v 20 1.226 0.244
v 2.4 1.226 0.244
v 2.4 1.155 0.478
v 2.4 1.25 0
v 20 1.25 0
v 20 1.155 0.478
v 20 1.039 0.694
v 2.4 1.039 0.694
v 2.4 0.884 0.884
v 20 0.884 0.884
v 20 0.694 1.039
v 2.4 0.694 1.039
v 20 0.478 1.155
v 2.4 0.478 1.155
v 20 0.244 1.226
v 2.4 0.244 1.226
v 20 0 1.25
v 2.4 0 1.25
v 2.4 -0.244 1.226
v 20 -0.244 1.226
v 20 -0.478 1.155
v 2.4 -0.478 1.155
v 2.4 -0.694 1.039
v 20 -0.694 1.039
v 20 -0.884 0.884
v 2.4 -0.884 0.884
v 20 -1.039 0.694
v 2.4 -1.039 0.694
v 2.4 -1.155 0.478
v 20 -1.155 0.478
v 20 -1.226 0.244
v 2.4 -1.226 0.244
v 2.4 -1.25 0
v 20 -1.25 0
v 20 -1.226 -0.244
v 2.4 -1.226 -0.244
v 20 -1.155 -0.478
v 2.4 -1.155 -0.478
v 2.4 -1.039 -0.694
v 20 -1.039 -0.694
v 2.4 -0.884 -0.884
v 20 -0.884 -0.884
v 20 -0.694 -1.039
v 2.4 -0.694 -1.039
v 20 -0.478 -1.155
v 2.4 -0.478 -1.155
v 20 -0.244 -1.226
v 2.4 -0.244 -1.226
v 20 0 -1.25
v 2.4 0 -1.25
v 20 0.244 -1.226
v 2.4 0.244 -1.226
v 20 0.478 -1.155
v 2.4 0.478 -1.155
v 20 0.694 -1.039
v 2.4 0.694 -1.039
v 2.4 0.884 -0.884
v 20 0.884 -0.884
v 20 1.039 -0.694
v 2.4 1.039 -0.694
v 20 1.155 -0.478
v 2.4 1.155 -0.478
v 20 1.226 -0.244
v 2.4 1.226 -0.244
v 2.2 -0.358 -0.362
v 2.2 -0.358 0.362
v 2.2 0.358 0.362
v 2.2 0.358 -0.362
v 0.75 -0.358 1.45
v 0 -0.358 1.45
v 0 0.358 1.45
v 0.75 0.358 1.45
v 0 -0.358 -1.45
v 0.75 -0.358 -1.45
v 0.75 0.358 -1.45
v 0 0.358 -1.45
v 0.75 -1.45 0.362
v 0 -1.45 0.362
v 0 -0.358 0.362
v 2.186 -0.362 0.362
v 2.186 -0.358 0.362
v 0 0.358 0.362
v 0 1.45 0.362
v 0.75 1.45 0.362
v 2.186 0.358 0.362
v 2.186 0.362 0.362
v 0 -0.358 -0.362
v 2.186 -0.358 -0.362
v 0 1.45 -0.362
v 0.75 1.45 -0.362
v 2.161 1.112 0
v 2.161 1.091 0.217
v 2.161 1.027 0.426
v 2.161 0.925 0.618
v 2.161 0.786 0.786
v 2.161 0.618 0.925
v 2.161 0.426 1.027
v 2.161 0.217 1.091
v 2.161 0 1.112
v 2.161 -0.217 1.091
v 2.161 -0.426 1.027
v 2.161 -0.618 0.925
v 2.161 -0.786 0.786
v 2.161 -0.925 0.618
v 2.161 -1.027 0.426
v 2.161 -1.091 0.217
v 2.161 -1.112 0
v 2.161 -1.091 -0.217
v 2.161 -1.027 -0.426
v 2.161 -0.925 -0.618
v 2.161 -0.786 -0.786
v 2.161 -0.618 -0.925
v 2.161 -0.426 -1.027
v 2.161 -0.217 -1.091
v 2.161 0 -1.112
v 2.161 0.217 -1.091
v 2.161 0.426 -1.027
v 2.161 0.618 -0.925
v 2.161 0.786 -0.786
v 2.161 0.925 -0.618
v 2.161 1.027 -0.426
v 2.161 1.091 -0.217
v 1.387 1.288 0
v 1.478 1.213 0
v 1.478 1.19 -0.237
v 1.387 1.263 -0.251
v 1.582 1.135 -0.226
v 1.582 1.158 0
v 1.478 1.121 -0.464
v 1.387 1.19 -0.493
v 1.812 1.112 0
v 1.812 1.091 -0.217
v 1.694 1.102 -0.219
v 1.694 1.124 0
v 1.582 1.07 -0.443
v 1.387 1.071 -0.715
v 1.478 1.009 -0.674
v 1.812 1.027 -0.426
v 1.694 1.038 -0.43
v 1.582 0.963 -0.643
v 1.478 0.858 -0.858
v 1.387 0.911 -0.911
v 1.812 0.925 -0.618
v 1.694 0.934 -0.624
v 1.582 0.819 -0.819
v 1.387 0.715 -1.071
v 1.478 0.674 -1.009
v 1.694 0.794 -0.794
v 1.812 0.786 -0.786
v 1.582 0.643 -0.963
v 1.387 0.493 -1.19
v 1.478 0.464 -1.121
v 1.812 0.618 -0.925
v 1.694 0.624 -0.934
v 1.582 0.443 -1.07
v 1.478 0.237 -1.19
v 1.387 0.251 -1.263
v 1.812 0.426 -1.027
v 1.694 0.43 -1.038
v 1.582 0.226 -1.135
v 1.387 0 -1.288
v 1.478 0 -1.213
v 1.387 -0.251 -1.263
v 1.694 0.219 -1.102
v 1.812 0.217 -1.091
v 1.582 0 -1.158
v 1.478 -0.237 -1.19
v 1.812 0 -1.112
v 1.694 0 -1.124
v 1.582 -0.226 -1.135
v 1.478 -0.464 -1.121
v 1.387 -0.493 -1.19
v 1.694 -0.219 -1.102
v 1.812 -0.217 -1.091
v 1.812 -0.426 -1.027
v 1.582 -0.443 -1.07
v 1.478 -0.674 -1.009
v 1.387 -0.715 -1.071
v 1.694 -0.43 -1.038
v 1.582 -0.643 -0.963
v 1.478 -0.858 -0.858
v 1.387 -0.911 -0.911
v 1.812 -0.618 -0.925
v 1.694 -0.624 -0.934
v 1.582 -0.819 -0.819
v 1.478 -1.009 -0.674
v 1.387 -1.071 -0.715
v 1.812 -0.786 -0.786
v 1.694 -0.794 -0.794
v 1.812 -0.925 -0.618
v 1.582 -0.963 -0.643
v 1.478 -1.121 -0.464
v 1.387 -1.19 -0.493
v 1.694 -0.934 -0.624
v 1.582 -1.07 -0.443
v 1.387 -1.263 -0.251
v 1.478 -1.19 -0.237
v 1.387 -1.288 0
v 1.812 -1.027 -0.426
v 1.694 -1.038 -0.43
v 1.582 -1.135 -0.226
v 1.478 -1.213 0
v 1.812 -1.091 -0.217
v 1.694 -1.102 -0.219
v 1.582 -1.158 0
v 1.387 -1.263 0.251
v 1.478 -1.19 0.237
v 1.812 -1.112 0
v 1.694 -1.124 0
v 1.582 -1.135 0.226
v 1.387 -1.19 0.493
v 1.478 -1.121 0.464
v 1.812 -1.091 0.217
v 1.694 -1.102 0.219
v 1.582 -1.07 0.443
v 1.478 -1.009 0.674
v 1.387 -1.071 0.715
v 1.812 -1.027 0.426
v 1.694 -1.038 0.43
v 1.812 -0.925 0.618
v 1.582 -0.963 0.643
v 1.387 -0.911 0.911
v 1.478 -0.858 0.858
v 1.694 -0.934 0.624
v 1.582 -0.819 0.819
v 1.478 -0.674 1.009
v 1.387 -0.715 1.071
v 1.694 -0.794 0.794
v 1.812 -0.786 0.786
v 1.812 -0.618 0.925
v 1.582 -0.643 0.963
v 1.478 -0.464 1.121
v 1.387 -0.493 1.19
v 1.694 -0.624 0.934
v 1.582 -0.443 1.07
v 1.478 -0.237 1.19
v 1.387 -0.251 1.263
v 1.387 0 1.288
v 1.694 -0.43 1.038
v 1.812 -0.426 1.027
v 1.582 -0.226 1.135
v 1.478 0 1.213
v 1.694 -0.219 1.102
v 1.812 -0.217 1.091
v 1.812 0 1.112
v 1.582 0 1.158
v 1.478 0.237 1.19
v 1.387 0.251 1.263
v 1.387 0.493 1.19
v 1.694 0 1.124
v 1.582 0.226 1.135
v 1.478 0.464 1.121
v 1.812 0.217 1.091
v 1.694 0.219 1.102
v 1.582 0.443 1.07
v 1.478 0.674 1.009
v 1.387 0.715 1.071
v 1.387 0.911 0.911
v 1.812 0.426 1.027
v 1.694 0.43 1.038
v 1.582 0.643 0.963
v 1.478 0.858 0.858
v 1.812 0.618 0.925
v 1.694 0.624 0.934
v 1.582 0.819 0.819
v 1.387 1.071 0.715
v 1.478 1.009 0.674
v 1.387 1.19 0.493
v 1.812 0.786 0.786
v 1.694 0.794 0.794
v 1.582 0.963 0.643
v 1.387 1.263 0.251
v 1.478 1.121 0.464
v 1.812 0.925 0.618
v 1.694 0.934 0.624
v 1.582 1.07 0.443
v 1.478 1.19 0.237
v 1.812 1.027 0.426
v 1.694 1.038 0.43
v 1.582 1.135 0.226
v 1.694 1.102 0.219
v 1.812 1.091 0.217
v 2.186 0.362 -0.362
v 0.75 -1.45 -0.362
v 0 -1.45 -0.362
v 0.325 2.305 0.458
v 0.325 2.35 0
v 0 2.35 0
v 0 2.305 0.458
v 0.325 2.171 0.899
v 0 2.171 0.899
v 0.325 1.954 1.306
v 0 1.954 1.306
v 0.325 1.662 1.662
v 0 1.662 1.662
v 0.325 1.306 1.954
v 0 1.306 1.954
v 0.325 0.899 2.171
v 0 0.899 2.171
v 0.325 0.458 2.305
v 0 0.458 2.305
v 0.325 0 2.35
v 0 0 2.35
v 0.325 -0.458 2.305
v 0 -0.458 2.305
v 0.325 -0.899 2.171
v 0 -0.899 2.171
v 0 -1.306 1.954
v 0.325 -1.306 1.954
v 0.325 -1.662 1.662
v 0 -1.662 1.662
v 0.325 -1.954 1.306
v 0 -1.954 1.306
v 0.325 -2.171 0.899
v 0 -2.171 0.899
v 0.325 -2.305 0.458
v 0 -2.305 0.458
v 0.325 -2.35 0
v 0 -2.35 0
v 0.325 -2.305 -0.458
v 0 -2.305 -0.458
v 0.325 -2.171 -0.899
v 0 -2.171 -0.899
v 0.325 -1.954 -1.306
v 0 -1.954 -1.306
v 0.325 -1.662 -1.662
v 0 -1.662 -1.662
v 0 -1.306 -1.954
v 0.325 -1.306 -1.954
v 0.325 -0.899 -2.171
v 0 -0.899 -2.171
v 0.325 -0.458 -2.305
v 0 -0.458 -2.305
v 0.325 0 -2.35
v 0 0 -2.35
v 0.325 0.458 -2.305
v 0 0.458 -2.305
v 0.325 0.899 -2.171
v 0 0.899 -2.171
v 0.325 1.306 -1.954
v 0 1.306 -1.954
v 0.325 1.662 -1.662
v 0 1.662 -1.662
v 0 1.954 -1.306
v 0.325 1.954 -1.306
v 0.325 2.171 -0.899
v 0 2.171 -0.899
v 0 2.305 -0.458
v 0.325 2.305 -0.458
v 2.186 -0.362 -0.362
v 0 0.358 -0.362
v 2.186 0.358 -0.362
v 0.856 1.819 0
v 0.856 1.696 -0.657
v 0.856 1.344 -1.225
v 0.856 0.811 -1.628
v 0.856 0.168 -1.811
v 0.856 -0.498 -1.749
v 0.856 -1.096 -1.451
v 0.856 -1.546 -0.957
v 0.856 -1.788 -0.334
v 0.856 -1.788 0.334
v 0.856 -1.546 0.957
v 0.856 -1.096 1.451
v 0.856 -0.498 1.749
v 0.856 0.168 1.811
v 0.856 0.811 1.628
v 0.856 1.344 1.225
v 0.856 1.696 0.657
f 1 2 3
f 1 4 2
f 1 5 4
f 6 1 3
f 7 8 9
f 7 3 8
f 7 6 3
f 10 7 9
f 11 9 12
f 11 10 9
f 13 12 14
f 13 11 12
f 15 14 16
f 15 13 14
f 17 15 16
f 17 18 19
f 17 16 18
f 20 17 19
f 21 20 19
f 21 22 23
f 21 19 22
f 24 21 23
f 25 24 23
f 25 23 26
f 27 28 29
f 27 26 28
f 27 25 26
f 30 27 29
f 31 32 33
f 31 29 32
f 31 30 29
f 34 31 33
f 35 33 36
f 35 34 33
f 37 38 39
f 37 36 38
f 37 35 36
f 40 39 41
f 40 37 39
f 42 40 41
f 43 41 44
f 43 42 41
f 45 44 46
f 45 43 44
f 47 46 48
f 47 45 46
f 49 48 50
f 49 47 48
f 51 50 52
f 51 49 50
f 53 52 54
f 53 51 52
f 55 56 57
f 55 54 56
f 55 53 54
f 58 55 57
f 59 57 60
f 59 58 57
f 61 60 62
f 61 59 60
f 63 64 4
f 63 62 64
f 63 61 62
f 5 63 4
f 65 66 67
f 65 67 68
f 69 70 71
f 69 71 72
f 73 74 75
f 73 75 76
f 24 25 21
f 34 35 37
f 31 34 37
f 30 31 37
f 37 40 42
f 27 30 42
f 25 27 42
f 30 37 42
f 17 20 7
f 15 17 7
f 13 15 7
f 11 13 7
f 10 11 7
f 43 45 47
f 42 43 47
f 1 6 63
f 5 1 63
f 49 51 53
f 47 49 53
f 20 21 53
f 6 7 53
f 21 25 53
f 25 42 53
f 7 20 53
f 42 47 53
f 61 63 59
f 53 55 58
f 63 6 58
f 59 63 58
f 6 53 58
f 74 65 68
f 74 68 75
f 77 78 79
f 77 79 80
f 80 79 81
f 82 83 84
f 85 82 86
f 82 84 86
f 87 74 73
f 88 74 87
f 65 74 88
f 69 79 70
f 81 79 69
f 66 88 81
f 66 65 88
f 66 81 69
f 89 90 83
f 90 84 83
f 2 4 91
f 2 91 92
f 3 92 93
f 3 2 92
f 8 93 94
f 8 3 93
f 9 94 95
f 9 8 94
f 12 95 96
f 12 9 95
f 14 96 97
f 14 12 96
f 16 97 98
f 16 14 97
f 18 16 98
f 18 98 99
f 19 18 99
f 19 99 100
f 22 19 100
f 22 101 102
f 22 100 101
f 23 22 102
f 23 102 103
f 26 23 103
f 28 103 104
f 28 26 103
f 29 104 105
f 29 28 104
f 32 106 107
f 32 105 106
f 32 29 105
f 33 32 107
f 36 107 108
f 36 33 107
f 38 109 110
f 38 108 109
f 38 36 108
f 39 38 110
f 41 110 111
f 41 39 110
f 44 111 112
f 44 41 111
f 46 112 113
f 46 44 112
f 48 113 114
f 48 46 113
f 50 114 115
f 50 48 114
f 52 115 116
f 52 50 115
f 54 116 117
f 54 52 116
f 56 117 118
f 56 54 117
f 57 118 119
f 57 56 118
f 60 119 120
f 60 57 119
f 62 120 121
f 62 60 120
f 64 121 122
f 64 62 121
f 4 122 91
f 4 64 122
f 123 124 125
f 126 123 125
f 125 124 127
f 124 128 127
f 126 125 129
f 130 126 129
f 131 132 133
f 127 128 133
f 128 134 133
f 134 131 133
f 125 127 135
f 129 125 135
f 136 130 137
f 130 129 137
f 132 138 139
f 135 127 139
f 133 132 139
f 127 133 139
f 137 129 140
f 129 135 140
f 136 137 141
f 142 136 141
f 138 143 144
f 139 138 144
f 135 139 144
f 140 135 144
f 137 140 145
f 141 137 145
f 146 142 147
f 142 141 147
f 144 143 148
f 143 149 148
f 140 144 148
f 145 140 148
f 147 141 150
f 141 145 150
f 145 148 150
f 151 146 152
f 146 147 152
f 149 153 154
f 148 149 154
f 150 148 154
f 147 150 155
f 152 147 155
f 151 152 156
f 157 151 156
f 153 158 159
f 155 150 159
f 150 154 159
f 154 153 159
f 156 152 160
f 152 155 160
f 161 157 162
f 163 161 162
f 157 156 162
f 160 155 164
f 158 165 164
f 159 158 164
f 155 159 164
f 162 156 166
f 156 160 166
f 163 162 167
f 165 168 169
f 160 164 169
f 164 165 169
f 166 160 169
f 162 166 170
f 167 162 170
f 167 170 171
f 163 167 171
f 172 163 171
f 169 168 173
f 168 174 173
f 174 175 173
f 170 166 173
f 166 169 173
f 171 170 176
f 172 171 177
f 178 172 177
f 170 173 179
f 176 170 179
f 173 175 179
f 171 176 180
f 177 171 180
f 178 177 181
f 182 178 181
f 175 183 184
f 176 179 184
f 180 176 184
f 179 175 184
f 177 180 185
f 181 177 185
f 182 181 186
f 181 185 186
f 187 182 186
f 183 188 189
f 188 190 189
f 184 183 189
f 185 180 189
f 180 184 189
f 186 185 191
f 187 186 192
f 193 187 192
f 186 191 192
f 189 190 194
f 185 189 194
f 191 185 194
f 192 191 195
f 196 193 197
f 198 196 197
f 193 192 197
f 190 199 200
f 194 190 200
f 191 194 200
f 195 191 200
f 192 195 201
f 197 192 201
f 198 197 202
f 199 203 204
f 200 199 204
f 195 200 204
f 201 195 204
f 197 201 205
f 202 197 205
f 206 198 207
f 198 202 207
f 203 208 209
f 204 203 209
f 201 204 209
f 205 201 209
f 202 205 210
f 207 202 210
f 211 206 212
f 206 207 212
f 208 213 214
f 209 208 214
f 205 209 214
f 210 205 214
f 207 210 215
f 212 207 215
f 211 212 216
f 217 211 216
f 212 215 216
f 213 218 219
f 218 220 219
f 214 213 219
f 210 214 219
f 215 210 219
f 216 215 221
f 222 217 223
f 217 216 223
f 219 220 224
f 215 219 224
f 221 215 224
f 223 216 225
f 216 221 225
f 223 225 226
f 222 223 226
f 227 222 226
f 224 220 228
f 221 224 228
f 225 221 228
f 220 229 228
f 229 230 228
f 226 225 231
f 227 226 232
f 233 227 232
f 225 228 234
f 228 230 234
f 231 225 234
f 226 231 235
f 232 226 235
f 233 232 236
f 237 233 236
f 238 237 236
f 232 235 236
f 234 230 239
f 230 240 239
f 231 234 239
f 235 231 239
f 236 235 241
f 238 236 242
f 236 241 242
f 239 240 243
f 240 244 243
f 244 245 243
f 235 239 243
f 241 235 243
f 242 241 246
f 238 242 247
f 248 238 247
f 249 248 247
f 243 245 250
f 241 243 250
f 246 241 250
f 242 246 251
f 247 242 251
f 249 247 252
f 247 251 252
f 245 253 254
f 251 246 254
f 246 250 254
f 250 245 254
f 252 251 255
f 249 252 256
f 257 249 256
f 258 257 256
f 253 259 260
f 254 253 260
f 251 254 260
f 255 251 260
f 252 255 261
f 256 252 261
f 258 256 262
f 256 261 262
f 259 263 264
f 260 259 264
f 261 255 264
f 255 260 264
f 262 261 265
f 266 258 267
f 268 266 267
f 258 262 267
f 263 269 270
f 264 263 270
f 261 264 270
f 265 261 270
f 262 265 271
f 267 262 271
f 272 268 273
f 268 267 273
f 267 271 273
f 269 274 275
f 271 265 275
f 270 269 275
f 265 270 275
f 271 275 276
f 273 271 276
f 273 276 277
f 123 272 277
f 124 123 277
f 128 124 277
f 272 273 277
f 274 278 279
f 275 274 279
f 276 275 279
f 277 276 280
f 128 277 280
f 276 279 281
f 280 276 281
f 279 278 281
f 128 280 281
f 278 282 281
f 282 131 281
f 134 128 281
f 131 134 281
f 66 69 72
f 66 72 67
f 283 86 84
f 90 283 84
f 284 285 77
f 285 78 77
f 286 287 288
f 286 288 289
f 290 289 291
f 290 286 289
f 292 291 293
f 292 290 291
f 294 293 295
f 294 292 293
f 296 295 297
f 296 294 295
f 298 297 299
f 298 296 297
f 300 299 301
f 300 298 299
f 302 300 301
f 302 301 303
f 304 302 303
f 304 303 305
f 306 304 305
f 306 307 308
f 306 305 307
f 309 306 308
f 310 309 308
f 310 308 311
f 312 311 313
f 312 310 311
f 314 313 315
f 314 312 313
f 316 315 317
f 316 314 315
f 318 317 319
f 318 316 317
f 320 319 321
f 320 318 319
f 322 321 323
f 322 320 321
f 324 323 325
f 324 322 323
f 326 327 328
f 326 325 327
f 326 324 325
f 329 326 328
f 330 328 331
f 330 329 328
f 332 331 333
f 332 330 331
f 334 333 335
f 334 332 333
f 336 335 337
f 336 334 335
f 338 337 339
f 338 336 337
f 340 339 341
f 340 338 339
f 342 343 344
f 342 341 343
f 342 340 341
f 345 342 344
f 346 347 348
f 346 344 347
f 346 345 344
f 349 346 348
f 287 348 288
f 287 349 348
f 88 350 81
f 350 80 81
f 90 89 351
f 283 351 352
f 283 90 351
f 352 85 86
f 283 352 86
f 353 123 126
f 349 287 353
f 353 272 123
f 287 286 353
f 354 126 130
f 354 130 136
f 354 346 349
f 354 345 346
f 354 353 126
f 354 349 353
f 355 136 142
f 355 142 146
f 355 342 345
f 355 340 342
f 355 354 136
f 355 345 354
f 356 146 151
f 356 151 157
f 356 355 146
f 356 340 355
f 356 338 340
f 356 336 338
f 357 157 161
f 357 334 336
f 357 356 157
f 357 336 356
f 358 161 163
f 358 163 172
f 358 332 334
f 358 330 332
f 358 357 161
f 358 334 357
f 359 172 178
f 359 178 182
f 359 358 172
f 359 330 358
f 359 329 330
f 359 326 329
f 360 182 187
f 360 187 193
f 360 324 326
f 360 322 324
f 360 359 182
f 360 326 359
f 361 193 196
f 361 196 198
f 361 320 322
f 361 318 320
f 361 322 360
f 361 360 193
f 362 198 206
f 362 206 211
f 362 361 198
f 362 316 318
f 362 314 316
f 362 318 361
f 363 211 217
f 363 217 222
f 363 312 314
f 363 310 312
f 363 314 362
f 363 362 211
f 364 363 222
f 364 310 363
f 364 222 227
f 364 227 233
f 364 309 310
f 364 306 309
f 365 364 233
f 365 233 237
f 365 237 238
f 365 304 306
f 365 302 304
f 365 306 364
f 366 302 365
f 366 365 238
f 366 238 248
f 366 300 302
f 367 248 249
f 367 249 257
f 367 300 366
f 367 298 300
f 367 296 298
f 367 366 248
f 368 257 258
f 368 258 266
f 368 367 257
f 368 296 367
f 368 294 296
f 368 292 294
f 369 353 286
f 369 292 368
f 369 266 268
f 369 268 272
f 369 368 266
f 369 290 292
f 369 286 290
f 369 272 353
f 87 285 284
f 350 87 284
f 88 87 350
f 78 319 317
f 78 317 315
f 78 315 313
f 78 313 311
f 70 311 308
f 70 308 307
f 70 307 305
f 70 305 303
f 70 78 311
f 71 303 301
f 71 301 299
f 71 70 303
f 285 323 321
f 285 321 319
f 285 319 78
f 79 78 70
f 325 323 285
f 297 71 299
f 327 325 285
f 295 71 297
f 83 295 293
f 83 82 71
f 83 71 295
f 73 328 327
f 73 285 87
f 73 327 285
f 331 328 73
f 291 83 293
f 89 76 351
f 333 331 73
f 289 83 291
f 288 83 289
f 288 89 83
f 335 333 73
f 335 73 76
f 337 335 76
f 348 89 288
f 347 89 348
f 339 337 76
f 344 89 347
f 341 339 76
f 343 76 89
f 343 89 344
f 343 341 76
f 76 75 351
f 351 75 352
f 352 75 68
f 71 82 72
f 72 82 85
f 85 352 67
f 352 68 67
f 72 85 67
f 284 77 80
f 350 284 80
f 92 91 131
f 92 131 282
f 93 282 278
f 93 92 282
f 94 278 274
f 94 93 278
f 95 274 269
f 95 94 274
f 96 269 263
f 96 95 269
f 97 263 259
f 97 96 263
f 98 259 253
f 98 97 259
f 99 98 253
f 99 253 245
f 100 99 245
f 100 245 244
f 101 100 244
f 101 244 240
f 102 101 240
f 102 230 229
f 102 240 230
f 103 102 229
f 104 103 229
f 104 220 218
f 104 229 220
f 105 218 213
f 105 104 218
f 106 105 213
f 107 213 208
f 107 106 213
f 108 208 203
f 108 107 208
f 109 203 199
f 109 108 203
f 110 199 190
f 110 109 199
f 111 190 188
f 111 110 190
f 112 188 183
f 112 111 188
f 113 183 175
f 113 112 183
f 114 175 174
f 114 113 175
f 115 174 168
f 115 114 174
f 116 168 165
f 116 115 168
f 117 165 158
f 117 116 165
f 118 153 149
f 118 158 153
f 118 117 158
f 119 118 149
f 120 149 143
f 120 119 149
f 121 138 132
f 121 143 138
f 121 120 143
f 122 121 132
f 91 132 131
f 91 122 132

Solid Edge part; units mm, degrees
sketch "Sketch1" plane through (0, 0, 0) normal (0, 0, 1) x (1, 0, 0)
  line L0 (0, 0) -> (0, 2.35)
  line L1 (0, 2.35) -> (0.325, 2.35)
  line L2 (0.325, 2.35) -> (1.3873, 1.2877)
  arc A0 (1.3873, 1.2877) -> (1.8115, 1.112) centre (1.8115, 1.712) ccw
  line L3 (1.8115, 1.112) -> (2.161, 1.112)
  line L4 (2.161, 1.112) -> (2.4, 1.25)
  line L5 (2.4, 1.25) -> (20, 1.25)
  line L6 (20, 1.25) -> (20, 0)
  line L7 (20, 0) -> (0, 0)
revolve "RevolvedProtrusion1" add sketch "Sketch1" angle 360 about axis through (20, 0, 0) along (-1, 0, 0)
sketch "Sketch2" plane through (0, 0, 0) normal (0, 0, 1) x (1, 0, 0)
  line L0 (-1, 1.45) -> (-1, -1.45)
  line L1 (-1, -1.45) -> (0.75, -1.45)
  line L2 (0.75, -1.45) -> (2.1855, -0.3625)
  line L3 (2.1855, -0.3625) -> (2.1855, 0.3625)
  line L4 (2.1855, 0.3625) -> (0.75, 1.45)
  line L5 (0.75, 1.45) -> (-1, 1.45)
extrude "ExtrudedCutout_1" cut sketch "Sketch2" against normal blind 0.3625 and the other way blind 0.3625
sketch "Sketch3" plane through (0, 0, 0) normal (0, -1, 0) x (1, 0, 0)
  line L0 (-1, -1.45) -> (-1, 1.45)
  line L1 (-1, 1.45) -> (0.75, 1.45)
  line L2 (0.75, 1.45) -> (2.2, 0.3625)
  line L3 (2.2, 0.3625) -> (2.2, -0.3625)
  line L4 (2.2, -0.3625) -> (0.75, -1.45)
  line L5 (0.75, -1.45) -> (-1, -1.45)
extrude "ExtrudedCutout_2" cut sketch "Sketch3" against normal blind 0.358 and the other way blind 0.358
properties part number "SFS FN 406 283597 Senkschraube ISO 7046-1 Stahl 4.8 verzinkt blau M2.5x20-H"
